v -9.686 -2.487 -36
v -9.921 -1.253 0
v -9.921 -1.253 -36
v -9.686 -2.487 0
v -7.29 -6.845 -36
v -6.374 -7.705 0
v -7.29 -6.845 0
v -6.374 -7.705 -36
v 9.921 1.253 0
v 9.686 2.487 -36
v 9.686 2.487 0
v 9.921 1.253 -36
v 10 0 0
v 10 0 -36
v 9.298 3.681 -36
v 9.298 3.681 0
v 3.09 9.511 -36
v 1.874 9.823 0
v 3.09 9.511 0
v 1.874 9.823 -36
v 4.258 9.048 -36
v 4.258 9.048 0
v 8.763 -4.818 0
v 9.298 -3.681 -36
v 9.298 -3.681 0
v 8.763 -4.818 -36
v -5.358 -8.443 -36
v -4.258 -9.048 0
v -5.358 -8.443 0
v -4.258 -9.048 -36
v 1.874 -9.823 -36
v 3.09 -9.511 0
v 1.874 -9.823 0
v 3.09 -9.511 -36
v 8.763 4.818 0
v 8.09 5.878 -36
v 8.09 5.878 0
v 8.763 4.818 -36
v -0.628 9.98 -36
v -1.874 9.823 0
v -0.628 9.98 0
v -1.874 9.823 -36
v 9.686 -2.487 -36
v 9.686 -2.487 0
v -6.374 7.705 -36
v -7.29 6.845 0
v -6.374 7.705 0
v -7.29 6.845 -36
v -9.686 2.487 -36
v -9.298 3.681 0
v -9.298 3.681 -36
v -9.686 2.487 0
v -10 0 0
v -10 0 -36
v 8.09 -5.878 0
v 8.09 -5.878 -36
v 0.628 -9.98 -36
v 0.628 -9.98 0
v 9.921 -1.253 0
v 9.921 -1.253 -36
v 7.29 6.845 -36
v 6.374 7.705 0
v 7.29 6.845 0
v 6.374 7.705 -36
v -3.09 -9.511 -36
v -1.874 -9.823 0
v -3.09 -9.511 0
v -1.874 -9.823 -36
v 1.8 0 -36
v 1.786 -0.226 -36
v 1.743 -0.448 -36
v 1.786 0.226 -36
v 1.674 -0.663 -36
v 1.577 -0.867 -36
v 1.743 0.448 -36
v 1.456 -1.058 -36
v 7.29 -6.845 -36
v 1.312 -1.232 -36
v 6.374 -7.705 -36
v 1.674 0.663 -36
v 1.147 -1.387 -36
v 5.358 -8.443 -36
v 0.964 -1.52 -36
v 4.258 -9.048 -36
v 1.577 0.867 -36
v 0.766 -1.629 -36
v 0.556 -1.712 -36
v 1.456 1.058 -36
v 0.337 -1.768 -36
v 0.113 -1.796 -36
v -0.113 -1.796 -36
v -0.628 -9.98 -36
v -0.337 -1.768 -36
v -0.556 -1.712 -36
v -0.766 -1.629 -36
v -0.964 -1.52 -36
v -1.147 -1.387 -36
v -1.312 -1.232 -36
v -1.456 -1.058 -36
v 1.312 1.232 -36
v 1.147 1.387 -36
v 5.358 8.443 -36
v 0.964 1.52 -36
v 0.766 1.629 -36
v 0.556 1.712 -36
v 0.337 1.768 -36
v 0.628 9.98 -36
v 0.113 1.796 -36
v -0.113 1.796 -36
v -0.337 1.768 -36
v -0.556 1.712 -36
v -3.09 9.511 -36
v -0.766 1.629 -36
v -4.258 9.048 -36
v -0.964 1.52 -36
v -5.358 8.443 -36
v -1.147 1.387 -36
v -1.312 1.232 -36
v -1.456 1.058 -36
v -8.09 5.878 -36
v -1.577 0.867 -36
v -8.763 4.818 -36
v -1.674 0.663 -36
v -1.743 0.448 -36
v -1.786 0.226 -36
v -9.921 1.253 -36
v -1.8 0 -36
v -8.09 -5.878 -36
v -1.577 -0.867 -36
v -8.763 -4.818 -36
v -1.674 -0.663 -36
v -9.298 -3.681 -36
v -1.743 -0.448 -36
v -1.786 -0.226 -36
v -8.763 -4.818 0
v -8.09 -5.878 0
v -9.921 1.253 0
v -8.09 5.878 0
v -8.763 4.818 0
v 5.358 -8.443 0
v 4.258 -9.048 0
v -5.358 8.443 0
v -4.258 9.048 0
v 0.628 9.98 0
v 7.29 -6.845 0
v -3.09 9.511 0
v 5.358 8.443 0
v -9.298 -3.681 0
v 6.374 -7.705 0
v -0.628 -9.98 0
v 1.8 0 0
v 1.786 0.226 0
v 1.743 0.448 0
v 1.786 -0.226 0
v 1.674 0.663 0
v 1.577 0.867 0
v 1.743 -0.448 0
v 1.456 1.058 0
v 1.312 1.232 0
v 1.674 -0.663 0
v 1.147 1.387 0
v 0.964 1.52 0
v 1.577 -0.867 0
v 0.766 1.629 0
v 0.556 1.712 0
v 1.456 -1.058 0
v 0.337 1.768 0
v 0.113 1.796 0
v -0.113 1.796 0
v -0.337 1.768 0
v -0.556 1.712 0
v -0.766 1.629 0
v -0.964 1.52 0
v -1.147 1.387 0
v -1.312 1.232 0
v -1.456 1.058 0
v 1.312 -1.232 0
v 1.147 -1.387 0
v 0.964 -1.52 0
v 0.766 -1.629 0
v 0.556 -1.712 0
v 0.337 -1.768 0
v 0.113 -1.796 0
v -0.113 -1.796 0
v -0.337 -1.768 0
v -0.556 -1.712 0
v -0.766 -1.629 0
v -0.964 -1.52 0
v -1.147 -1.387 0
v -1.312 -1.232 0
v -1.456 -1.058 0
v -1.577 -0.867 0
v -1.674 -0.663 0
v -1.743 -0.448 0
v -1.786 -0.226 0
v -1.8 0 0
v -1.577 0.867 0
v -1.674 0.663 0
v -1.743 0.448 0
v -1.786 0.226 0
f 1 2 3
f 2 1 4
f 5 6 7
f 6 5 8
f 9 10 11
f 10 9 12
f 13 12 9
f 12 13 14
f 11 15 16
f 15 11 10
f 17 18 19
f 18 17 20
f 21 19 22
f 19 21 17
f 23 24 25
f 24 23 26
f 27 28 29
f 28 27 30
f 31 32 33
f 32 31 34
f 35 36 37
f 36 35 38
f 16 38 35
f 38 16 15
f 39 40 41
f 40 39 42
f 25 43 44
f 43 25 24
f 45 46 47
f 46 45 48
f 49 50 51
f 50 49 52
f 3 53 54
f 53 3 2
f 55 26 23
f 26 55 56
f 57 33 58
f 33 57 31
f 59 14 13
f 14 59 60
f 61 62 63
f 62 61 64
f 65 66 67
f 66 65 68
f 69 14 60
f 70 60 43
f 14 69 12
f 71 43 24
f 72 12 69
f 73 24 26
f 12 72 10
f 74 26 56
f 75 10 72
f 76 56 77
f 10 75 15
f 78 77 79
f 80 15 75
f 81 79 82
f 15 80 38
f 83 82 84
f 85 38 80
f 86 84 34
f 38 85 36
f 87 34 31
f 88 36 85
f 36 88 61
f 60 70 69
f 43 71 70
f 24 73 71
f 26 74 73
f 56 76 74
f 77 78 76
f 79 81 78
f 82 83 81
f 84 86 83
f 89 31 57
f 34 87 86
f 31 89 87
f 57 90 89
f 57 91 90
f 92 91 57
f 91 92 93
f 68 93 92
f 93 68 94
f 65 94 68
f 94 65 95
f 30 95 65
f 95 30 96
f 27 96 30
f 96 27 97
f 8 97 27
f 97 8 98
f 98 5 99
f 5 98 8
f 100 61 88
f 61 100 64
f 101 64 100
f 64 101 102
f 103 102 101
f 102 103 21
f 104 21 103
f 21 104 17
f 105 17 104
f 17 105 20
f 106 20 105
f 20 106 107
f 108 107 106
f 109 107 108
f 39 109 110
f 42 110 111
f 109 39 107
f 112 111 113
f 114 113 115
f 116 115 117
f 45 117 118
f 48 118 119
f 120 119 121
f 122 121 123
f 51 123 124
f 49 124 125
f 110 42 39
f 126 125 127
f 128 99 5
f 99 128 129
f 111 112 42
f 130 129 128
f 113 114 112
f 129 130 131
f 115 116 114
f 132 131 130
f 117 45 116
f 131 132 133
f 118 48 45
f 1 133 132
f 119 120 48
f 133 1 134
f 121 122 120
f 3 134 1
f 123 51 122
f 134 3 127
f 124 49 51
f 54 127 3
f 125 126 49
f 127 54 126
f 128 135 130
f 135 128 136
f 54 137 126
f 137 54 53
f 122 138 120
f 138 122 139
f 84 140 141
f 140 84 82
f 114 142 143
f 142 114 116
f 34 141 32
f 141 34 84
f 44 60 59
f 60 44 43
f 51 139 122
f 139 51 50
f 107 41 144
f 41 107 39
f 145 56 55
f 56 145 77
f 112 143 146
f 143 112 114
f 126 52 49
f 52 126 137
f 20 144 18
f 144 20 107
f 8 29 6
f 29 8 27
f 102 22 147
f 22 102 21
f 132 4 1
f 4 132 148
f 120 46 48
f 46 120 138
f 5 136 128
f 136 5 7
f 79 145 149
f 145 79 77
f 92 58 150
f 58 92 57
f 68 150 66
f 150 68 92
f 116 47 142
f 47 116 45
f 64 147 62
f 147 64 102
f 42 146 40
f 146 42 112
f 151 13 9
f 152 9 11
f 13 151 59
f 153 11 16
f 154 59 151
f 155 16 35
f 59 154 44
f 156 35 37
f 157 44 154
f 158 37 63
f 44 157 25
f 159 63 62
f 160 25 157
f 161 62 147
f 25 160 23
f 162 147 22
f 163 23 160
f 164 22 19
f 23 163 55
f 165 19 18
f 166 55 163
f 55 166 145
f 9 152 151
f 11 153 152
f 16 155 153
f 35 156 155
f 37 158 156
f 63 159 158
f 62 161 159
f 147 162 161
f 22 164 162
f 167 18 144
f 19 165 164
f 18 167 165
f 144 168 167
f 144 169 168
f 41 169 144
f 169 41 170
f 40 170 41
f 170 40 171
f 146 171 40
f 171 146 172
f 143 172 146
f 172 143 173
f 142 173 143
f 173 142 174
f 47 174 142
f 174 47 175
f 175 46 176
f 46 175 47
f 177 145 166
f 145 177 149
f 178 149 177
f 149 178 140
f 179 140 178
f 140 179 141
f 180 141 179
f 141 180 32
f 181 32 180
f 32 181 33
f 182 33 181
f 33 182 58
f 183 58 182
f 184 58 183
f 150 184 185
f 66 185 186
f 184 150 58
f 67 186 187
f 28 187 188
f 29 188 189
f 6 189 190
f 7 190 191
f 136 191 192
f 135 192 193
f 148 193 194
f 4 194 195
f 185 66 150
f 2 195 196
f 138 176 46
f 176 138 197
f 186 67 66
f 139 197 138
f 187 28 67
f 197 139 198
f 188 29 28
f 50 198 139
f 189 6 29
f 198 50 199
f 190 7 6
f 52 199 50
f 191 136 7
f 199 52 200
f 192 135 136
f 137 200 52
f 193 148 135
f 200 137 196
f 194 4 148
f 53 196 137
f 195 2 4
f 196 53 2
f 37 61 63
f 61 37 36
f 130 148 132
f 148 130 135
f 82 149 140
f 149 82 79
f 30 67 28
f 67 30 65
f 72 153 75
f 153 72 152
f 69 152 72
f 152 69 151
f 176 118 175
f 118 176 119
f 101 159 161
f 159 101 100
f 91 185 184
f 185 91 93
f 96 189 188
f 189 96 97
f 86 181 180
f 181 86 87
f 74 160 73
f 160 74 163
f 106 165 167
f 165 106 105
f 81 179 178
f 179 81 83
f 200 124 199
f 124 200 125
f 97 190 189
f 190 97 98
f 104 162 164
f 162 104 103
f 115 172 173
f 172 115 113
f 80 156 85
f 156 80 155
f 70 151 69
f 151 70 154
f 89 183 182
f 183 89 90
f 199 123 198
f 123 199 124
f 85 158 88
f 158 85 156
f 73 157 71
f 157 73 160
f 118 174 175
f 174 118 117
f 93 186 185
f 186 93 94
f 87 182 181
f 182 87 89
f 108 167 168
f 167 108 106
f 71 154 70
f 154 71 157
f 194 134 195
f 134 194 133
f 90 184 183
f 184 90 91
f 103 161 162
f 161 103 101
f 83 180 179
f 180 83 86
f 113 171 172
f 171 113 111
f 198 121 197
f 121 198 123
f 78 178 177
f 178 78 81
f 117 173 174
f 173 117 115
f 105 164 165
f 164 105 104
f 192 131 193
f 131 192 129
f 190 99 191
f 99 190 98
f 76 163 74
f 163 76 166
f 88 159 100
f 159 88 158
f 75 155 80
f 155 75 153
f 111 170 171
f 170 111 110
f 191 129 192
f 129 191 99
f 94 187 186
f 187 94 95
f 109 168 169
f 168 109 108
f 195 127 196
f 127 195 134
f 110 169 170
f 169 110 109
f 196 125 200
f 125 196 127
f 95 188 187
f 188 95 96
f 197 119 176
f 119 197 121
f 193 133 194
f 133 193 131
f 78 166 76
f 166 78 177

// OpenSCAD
$fn = 50;


difference() {
	union() {
		translate(v = [0, 0, -36.0000000000]) {
			cylinder(h = 36, r = 10.0000000000);
		}
	}
	union() {
		#translate(v = [0, 0, -36]) {
			cylinder(h = 36, r = 1.8000000000);
		}
	}
}
